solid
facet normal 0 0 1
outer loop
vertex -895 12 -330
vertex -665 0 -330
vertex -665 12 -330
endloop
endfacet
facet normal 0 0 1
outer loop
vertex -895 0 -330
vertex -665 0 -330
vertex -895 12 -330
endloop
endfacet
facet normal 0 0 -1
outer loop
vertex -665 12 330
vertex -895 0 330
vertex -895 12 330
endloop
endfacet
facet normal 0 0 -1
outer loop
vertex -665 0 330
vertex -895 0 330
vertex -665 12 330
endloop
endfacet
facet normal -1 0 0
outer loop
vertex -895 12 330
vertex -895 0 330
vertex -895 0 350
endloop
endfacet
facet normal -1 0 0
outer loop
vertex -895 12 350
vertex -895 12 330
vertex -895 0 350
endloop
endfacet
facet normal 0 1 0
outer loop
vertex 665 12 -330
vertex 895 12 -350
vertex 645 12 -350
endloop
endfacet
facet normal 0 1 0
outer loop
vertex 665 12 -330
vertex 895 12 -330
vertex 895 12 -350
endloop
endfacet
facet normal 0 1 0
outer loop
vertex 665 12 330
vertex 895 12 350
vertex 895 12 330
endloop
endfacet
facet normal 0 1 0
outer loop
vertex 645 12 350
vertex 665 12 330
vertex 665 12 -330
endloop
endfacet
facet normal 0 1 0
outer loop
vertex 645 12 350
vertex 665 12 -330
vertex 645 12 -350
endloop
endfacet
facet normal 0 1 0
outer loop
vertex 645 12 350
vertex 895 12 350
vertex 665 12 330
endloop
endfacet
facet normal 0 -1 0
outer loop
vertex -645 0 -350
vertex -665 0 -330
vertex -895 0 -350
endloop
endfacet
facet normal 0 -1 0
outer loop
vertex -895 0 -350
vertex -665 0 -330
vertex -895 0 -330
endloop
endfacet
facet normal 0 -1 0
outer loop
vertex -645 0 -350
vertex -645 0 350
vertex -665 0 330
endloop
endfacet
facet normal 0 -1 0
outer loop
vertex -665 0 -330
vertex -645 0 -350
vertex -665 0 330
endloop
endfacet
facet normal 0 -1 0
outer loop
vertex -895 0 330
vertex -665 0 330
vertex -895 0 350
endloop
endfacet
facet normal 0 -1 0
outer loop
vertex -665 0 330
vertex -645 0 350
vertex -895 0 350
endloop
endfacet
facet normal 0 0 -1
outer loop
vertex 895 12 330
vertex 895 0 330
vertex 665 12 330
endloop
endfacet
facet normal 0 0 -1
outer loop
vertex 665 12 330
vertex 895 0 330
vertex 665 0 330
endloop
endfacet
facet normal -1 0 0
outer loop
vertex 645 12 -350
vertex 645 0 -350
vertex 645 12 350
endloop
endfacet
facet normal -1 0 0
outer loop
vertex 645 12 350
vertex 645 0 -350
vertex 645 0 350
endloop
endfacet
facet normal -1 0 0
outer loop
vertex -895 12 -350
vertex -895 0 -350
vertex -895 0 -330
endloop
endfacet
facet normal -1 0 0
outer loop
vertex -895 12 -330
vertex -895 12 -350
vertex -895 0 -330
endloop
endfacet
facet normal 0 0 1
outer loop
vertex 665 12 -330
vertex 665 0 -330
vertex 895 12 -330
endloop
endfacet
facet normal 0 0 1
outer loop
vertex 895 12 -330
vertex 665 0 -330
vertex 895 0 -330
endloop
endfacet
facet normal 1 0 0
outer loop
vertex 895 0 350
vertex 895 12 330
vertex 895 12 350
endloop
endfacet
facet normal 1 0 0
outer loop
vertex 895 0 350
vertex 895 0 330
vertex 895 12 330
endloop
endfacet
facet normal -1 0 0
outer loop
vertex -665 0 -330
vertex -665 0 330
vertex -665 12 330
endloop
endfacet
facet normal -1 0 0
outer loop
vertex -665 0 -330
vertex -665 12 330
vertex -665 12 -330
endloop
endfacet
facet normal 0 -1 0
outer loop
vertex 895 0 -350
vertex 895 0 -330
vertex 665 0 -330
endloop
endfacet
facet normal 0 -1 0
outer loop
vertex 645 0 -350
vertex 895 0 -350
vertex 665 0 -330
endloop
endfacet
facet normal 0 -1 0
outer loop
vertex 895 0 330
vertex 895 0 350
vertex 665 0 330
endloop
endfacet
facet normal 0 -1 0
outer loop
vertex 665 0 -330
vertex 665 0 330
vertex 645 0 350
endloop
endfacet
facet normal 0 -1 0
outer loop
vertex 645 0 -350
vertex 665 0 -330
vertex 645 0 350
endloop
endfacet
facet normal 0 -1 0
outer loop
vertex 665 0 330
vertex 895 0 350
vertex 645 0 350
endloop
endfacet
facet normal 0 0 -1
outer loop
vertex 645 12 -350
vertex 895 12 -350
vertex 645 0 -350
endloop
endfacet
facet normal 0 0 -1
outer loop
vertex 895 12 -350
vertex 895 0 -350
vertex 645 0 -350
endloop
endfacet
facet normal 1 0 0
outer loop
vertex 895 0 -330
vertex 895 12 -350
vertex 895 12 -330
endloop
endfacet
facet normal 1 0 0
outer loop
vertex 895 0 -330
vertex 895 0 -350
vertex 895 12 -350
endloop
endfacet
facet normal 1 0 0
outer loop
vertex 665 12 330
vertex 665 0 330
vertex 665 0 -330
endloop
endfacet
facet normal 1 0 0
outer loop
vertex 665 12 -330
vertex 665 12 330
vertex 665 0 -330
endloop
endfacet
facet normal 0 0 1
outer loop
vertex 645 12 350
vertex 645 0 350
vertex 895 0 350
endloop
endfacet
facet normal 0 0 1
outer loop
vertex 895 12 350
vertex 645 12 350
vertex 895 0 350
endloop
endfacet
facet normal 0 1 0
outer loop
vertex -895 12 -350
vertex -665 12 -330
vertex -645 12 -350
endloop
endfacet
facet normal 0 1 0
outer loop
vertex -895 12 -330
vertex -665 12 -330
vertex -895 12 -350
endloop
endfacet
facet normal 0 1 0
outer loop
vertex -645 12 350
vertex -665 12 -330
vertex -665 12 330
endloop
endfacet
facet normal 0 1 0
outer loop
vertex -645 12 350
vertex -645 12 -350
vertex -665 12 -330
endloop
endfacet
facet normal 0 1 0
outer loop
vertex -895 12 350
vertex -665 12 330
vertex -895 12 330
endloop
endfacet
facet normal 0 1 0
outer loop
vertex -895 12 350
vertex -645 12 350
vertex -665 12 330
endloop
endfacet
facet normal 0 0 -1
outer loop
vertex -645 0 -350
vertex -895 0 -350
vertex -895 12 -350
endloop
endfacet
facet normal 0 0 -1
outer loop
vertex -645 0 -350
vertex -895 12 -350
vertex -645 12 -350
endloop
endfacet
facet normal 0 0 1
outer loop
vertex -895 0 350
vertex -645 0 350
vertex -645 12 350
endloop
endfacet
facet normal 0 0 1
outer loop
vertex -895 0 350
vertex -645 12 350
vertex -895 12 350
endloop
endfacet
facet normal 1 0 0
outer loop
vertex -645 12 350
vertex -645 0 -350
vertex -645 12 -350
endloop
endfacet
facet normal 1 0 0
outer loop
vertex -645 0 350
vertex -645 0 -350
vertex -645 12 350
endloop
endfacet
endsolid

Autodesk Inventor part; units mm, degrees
ref_plane "YZ Plane" through (0, 0, 0) normal (1, 0, 0) x (0, 1, 0)
ref_plane "XZ Plane" through (0, 0, 0) normal (0, 1, 0) x (-1, 0, 0)
ref_plane "XY Plane" through (0, 0, 0) normal (0, 0, 1) x (1, 0, 0)
sketch "Эскиз1" plane through (0, 0, 0) normal (0, 1, 0) x (-1, 0, 0)
  line L0 (895, -350) -> (645, -350)
  line L1 (645, -350) -> (645, 350)
  line L2 (645, 350) -> (895, 350)
  line L3 (0, -490) -> (0, 490) construction
  line L4 (1463.2221, 0) -> (-1288.037, 0) construction
  line L5 (895, 330) -> (665, 330)
  line L6 (665, 330) -> (665, -330)
  line L7 (665, -330) -> (895, -330)
  line L8 (895, -350) -> (895, -330)
  line L9 (895, 330) -> (895, 350)
  line L10 (-895, -350) -> (-645, -350)
  line L11 (-645, -350) -> (-645, 350)
  line L12 (-645, 350) -> (-895, 350)
  line L13 (-895, 330) -> (-665, 330)
  line L14 (-665, 330) -> (-665, -330)
  line L15 (-665, -330) -> (-895, -330)
  line L16 (-895, -350) -> (-895, -330)
  line L17 (-895, 330) -> (-895, 350)
  line L18 (895, -350) -> (895, 350) construction
  line L19 (895, 30) -> (1070.1851, 30)
  line L20 (1070.1851, 30) -> (1070.1851, -30)
  line L21 (1070.1851, -30) -> (895, -30)
  point P0 (0, 0)
  dimension "d0" = 250
  dimension "d1" = 700
  dimension "d2" = 645
  dimension "d3" = 20
  dimension "d6" = 60
extrude "Выдавливание1" add sketch "Эскиз1" along normal blind 12
properties part number "Place_of_goalKipeer"
